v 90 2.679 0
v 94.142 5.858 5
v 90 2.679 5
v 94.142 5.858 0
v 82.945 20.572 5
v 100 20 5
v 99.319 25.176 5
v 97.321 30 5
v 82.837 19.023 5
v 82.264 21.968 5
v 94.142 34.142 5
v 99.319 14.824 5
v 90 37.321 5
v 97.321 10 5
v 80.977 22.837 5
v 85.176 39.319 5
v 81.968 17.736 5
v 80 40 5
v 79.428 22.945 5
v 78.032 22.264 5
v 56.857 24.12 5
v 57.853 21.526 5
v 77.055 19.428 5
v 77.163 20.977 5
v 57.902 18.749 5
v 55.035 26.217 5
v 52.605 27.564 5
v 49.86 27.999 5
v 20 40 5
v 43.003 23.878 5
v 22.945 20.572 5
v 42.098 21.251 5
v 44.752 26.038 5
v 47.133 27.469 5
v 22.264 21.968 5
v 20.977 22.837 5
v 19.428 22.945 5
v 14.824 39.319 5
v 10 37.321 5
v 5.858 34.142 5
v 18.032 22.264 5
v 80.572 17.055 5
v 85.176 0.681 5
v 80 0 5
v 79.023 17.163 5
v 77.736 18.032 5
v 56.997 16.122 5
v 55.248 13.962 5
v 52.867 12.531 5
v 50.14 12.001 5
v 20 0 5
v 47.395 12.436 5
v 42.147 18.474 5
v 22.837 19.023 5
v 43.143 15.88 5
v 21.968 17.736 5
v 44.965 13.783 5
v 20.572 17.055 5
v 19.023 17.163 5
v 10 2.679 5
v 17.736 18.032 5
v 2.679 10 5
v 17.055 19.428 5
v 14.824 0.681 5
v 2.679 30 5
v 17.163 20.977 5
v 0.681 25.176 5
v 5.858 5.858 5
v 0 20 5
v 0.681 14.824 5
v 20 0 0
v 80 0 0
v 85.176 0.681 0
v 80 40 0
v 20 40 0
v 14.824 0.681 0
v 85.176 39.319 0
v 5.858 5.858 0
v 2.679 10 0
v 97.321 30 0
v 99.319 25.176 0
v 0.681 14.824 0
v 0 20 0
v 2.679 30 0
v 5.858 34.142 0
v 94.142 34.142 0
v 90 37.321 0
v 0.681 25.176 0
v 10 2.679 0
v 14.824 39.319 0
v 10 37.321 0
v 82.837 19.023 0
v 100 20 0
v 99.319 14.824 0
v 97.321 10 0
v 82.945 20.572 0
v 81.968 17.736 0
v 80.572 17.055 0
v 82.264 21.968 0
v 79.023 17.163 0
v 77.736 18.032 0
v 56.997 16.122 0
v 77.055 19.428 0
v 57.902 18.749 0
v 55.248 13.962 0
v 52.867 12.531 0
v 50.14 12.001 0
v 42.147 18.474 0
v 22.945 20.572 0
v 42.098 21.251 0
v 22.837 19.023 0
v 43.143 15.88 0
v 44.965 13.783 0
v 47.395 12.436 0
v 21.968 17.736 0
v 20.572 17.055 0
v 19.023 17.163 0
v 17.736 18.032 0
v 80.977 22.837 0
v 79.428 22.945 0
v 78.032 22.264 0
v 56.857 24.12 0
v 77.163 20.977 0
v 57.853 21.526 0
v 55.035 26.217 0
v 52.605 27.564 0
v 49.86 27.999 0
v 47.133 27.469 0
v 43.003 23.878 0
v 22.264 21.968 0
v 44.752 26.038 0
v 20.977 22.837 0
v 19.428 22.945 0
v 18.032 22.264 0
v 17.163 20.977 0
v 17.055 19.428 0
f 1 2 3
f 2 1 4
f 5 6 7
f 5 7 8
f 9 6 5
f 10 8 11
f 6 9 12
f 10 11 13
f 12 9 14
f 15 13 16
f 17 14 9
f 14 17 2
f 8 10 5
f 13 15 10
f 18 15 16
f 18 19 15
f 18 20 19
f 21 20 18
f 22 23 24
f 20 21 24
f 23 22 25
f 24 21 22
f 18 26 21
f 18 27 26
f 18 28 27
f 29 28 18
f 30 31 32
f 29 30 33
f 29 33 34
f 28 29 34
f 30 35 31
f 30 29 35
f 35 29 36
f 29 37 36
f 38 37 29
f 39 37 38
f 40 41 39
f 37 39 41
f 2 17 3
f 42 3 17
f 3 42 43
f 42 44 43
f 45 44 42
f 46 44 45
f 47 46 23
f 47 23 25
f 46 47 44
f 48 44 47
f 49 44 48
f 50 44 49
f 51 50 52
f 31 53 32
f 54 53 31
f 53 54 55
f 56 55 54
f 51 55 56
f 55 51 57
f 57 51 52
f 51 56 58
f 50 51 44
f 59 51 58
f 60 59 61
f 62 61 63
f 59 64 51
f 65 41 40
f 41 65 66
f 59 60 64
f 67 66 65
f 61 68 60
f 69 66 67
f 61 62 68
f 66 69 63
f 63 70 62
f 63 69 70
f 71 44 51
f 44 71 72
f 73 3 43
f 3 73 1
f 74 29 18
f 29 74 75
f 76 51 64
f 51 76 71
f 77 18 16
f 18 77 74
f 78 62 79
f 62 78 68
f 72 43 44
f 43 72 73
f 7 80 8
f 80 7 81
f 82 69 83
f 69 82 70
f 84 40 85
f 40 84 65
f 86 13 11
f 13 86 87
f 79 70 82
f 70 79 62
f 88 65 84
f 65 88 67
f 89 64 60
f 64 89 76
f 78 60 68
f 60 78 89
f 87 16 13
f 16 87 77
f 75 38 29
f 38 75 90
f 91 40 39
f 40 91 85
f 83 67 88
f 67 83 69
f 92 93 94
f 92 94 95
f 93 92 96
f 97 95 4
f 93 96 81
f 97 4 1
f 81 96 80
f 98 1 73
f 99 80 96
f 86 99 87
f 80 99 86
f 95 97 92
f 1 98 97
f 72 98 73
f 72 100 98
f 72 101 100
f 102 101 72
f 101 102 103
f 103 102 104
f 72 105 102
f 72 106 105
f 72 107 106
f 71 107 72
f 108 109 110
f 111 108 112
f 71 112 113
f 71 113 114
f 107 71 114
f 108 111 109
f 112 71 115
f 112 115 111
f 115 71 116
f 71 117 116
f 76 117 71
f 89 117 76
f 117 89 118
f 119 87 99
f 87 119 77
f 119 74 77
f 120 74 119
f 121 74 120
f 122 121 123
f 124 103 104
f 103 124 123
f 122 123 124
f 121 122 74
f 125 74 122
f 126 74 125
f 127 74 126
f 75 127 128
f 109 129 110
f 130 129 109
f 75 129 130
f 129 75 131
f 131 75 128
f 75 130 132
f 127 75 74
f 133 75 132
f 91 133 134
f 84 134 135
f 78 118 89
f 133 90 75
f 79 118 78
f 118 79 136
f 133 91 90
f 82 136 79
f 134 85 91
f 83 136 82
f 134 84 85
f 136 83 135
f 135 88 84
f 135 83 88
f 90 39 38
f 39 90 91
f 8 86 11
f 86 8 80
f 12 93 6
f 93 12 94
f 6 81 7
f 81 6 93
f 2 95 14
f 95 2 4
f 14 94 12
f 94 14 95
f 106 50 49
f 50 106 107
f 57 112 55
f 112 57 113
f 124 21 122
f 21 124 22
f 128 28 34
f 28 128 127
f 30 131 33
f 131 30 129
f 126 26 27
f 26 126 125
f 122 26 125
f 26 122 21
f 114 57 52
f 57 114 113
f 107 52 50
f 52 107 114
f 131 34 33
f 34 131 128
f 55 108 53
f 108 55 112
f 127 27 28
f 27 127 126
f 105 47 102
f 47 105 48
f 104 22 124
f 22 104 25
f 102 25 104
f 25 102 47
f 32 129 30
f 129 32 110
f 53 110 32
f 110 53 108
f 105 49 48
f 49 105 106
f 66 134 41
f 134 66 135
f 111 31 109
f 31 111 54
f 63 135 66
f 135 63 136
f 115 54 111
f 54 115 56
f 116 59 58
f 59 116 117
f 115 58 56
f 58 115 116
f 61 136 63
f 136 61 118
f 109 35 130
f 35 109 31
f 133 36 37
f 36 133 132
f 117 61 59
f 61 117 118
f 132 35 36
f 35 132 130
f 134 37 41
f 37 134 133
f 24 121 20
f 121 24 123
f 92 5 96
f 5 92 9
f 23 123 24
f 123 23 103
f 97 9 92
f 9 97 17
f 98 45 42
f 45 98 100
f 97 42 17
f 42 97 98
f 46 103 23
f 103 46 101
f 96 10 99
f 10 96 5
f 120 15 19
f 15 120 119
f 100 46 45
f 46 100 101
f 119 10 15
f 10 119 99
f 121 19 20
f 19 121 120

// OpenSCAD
$fn = 32;

// ----------------------------------------------------------------------
// Spacer plate: obround span 60, caps R20
// ----------------------------------------------------------------------

// --- parameters (mm) ---
bore_r = 8;               // centre bore radius
bolt_r = 3;               // bolt hole radius
plate_t = 5;              // plate thickness, Z (extrusion height)
span = 60;                // obround span
cap_r = 20;               // cap radius

profile = [[20, 40], [14.824, 39.319], [10, 37.321], [5.858, 34.142], [2.679, 30], [0.681, 25.176], [0, 20], [0.681, 14.824], [2.679, 10], [5.858, 5.858], [10, 2.679], [14.824, 0.681], [20, 0], [80, 0], [85.176, 0.681], [90, 2.679], [94.142, 5.858], [97.321, 10], [99.319, 14.824], [100, 20], [99.319, 25.176], [97.321, 30], [94.142, 34.142], [90, 37.321], [85.176, 39.319], [80, 40]];  // primary outline, 26 points, counter clockwise
void_1 = [[57.853, 21.526], [56.857, 24.12], [55.035, 26.217], [52.605, 27.564], [49.86, 27.999], [47.133, 27.469], [44.752, 26.038], [43.003, 23.878], [42.098, 21.251], [42.147, 18.474], [43.143, 15.88], [44.965, 13.783], [47.395, 12.436], [50.14, 12.001], [52.867, 12.531], [55.248, 13.962], [56.997, 16.122], [57.902, 18.749]];  // centre bore, 18 points
void_2 = [[22.945, 20.572], [22.264, 21.968], [20.977, 22.837], [19.428, 22.945], [18.032, 22.264], [17.163, 20.977], [17.055, 19.428], [17.736, 18.032], [19.023, 17.163], [20.572, 17.055], [21.968, 17.736], [22.837, 19.023]];  // end hole, 12 points
void_3 = [[82.945, 20.572], [82.264, 21.968], [80.977, 22.837], [79.428, 22.945], [78.032, 22.264], [77.163, 20.977], [77.055, 19.428], [77.736, 18.032], [79.023, 17.163], [80.572, 17.055], [81.968, 17.736], [82.837, 19.023]];  // end hole, 12 points

// --- the one profile operation ---
difference() {
  linear_extrude(height = plate_t) polygon(points = profile);
  translate([0, 0, -1])
    linear_extrude(height = plate_t + 2) polygon(points = void_1);
  translate([0, 0, -1])
    linear_extrude(height = plate_t + 2) polygon(points = void_2);
  translate([0, 0, -1])
    linear_extrude(height = plate_t + 2) polygon(points = void_3);
}
